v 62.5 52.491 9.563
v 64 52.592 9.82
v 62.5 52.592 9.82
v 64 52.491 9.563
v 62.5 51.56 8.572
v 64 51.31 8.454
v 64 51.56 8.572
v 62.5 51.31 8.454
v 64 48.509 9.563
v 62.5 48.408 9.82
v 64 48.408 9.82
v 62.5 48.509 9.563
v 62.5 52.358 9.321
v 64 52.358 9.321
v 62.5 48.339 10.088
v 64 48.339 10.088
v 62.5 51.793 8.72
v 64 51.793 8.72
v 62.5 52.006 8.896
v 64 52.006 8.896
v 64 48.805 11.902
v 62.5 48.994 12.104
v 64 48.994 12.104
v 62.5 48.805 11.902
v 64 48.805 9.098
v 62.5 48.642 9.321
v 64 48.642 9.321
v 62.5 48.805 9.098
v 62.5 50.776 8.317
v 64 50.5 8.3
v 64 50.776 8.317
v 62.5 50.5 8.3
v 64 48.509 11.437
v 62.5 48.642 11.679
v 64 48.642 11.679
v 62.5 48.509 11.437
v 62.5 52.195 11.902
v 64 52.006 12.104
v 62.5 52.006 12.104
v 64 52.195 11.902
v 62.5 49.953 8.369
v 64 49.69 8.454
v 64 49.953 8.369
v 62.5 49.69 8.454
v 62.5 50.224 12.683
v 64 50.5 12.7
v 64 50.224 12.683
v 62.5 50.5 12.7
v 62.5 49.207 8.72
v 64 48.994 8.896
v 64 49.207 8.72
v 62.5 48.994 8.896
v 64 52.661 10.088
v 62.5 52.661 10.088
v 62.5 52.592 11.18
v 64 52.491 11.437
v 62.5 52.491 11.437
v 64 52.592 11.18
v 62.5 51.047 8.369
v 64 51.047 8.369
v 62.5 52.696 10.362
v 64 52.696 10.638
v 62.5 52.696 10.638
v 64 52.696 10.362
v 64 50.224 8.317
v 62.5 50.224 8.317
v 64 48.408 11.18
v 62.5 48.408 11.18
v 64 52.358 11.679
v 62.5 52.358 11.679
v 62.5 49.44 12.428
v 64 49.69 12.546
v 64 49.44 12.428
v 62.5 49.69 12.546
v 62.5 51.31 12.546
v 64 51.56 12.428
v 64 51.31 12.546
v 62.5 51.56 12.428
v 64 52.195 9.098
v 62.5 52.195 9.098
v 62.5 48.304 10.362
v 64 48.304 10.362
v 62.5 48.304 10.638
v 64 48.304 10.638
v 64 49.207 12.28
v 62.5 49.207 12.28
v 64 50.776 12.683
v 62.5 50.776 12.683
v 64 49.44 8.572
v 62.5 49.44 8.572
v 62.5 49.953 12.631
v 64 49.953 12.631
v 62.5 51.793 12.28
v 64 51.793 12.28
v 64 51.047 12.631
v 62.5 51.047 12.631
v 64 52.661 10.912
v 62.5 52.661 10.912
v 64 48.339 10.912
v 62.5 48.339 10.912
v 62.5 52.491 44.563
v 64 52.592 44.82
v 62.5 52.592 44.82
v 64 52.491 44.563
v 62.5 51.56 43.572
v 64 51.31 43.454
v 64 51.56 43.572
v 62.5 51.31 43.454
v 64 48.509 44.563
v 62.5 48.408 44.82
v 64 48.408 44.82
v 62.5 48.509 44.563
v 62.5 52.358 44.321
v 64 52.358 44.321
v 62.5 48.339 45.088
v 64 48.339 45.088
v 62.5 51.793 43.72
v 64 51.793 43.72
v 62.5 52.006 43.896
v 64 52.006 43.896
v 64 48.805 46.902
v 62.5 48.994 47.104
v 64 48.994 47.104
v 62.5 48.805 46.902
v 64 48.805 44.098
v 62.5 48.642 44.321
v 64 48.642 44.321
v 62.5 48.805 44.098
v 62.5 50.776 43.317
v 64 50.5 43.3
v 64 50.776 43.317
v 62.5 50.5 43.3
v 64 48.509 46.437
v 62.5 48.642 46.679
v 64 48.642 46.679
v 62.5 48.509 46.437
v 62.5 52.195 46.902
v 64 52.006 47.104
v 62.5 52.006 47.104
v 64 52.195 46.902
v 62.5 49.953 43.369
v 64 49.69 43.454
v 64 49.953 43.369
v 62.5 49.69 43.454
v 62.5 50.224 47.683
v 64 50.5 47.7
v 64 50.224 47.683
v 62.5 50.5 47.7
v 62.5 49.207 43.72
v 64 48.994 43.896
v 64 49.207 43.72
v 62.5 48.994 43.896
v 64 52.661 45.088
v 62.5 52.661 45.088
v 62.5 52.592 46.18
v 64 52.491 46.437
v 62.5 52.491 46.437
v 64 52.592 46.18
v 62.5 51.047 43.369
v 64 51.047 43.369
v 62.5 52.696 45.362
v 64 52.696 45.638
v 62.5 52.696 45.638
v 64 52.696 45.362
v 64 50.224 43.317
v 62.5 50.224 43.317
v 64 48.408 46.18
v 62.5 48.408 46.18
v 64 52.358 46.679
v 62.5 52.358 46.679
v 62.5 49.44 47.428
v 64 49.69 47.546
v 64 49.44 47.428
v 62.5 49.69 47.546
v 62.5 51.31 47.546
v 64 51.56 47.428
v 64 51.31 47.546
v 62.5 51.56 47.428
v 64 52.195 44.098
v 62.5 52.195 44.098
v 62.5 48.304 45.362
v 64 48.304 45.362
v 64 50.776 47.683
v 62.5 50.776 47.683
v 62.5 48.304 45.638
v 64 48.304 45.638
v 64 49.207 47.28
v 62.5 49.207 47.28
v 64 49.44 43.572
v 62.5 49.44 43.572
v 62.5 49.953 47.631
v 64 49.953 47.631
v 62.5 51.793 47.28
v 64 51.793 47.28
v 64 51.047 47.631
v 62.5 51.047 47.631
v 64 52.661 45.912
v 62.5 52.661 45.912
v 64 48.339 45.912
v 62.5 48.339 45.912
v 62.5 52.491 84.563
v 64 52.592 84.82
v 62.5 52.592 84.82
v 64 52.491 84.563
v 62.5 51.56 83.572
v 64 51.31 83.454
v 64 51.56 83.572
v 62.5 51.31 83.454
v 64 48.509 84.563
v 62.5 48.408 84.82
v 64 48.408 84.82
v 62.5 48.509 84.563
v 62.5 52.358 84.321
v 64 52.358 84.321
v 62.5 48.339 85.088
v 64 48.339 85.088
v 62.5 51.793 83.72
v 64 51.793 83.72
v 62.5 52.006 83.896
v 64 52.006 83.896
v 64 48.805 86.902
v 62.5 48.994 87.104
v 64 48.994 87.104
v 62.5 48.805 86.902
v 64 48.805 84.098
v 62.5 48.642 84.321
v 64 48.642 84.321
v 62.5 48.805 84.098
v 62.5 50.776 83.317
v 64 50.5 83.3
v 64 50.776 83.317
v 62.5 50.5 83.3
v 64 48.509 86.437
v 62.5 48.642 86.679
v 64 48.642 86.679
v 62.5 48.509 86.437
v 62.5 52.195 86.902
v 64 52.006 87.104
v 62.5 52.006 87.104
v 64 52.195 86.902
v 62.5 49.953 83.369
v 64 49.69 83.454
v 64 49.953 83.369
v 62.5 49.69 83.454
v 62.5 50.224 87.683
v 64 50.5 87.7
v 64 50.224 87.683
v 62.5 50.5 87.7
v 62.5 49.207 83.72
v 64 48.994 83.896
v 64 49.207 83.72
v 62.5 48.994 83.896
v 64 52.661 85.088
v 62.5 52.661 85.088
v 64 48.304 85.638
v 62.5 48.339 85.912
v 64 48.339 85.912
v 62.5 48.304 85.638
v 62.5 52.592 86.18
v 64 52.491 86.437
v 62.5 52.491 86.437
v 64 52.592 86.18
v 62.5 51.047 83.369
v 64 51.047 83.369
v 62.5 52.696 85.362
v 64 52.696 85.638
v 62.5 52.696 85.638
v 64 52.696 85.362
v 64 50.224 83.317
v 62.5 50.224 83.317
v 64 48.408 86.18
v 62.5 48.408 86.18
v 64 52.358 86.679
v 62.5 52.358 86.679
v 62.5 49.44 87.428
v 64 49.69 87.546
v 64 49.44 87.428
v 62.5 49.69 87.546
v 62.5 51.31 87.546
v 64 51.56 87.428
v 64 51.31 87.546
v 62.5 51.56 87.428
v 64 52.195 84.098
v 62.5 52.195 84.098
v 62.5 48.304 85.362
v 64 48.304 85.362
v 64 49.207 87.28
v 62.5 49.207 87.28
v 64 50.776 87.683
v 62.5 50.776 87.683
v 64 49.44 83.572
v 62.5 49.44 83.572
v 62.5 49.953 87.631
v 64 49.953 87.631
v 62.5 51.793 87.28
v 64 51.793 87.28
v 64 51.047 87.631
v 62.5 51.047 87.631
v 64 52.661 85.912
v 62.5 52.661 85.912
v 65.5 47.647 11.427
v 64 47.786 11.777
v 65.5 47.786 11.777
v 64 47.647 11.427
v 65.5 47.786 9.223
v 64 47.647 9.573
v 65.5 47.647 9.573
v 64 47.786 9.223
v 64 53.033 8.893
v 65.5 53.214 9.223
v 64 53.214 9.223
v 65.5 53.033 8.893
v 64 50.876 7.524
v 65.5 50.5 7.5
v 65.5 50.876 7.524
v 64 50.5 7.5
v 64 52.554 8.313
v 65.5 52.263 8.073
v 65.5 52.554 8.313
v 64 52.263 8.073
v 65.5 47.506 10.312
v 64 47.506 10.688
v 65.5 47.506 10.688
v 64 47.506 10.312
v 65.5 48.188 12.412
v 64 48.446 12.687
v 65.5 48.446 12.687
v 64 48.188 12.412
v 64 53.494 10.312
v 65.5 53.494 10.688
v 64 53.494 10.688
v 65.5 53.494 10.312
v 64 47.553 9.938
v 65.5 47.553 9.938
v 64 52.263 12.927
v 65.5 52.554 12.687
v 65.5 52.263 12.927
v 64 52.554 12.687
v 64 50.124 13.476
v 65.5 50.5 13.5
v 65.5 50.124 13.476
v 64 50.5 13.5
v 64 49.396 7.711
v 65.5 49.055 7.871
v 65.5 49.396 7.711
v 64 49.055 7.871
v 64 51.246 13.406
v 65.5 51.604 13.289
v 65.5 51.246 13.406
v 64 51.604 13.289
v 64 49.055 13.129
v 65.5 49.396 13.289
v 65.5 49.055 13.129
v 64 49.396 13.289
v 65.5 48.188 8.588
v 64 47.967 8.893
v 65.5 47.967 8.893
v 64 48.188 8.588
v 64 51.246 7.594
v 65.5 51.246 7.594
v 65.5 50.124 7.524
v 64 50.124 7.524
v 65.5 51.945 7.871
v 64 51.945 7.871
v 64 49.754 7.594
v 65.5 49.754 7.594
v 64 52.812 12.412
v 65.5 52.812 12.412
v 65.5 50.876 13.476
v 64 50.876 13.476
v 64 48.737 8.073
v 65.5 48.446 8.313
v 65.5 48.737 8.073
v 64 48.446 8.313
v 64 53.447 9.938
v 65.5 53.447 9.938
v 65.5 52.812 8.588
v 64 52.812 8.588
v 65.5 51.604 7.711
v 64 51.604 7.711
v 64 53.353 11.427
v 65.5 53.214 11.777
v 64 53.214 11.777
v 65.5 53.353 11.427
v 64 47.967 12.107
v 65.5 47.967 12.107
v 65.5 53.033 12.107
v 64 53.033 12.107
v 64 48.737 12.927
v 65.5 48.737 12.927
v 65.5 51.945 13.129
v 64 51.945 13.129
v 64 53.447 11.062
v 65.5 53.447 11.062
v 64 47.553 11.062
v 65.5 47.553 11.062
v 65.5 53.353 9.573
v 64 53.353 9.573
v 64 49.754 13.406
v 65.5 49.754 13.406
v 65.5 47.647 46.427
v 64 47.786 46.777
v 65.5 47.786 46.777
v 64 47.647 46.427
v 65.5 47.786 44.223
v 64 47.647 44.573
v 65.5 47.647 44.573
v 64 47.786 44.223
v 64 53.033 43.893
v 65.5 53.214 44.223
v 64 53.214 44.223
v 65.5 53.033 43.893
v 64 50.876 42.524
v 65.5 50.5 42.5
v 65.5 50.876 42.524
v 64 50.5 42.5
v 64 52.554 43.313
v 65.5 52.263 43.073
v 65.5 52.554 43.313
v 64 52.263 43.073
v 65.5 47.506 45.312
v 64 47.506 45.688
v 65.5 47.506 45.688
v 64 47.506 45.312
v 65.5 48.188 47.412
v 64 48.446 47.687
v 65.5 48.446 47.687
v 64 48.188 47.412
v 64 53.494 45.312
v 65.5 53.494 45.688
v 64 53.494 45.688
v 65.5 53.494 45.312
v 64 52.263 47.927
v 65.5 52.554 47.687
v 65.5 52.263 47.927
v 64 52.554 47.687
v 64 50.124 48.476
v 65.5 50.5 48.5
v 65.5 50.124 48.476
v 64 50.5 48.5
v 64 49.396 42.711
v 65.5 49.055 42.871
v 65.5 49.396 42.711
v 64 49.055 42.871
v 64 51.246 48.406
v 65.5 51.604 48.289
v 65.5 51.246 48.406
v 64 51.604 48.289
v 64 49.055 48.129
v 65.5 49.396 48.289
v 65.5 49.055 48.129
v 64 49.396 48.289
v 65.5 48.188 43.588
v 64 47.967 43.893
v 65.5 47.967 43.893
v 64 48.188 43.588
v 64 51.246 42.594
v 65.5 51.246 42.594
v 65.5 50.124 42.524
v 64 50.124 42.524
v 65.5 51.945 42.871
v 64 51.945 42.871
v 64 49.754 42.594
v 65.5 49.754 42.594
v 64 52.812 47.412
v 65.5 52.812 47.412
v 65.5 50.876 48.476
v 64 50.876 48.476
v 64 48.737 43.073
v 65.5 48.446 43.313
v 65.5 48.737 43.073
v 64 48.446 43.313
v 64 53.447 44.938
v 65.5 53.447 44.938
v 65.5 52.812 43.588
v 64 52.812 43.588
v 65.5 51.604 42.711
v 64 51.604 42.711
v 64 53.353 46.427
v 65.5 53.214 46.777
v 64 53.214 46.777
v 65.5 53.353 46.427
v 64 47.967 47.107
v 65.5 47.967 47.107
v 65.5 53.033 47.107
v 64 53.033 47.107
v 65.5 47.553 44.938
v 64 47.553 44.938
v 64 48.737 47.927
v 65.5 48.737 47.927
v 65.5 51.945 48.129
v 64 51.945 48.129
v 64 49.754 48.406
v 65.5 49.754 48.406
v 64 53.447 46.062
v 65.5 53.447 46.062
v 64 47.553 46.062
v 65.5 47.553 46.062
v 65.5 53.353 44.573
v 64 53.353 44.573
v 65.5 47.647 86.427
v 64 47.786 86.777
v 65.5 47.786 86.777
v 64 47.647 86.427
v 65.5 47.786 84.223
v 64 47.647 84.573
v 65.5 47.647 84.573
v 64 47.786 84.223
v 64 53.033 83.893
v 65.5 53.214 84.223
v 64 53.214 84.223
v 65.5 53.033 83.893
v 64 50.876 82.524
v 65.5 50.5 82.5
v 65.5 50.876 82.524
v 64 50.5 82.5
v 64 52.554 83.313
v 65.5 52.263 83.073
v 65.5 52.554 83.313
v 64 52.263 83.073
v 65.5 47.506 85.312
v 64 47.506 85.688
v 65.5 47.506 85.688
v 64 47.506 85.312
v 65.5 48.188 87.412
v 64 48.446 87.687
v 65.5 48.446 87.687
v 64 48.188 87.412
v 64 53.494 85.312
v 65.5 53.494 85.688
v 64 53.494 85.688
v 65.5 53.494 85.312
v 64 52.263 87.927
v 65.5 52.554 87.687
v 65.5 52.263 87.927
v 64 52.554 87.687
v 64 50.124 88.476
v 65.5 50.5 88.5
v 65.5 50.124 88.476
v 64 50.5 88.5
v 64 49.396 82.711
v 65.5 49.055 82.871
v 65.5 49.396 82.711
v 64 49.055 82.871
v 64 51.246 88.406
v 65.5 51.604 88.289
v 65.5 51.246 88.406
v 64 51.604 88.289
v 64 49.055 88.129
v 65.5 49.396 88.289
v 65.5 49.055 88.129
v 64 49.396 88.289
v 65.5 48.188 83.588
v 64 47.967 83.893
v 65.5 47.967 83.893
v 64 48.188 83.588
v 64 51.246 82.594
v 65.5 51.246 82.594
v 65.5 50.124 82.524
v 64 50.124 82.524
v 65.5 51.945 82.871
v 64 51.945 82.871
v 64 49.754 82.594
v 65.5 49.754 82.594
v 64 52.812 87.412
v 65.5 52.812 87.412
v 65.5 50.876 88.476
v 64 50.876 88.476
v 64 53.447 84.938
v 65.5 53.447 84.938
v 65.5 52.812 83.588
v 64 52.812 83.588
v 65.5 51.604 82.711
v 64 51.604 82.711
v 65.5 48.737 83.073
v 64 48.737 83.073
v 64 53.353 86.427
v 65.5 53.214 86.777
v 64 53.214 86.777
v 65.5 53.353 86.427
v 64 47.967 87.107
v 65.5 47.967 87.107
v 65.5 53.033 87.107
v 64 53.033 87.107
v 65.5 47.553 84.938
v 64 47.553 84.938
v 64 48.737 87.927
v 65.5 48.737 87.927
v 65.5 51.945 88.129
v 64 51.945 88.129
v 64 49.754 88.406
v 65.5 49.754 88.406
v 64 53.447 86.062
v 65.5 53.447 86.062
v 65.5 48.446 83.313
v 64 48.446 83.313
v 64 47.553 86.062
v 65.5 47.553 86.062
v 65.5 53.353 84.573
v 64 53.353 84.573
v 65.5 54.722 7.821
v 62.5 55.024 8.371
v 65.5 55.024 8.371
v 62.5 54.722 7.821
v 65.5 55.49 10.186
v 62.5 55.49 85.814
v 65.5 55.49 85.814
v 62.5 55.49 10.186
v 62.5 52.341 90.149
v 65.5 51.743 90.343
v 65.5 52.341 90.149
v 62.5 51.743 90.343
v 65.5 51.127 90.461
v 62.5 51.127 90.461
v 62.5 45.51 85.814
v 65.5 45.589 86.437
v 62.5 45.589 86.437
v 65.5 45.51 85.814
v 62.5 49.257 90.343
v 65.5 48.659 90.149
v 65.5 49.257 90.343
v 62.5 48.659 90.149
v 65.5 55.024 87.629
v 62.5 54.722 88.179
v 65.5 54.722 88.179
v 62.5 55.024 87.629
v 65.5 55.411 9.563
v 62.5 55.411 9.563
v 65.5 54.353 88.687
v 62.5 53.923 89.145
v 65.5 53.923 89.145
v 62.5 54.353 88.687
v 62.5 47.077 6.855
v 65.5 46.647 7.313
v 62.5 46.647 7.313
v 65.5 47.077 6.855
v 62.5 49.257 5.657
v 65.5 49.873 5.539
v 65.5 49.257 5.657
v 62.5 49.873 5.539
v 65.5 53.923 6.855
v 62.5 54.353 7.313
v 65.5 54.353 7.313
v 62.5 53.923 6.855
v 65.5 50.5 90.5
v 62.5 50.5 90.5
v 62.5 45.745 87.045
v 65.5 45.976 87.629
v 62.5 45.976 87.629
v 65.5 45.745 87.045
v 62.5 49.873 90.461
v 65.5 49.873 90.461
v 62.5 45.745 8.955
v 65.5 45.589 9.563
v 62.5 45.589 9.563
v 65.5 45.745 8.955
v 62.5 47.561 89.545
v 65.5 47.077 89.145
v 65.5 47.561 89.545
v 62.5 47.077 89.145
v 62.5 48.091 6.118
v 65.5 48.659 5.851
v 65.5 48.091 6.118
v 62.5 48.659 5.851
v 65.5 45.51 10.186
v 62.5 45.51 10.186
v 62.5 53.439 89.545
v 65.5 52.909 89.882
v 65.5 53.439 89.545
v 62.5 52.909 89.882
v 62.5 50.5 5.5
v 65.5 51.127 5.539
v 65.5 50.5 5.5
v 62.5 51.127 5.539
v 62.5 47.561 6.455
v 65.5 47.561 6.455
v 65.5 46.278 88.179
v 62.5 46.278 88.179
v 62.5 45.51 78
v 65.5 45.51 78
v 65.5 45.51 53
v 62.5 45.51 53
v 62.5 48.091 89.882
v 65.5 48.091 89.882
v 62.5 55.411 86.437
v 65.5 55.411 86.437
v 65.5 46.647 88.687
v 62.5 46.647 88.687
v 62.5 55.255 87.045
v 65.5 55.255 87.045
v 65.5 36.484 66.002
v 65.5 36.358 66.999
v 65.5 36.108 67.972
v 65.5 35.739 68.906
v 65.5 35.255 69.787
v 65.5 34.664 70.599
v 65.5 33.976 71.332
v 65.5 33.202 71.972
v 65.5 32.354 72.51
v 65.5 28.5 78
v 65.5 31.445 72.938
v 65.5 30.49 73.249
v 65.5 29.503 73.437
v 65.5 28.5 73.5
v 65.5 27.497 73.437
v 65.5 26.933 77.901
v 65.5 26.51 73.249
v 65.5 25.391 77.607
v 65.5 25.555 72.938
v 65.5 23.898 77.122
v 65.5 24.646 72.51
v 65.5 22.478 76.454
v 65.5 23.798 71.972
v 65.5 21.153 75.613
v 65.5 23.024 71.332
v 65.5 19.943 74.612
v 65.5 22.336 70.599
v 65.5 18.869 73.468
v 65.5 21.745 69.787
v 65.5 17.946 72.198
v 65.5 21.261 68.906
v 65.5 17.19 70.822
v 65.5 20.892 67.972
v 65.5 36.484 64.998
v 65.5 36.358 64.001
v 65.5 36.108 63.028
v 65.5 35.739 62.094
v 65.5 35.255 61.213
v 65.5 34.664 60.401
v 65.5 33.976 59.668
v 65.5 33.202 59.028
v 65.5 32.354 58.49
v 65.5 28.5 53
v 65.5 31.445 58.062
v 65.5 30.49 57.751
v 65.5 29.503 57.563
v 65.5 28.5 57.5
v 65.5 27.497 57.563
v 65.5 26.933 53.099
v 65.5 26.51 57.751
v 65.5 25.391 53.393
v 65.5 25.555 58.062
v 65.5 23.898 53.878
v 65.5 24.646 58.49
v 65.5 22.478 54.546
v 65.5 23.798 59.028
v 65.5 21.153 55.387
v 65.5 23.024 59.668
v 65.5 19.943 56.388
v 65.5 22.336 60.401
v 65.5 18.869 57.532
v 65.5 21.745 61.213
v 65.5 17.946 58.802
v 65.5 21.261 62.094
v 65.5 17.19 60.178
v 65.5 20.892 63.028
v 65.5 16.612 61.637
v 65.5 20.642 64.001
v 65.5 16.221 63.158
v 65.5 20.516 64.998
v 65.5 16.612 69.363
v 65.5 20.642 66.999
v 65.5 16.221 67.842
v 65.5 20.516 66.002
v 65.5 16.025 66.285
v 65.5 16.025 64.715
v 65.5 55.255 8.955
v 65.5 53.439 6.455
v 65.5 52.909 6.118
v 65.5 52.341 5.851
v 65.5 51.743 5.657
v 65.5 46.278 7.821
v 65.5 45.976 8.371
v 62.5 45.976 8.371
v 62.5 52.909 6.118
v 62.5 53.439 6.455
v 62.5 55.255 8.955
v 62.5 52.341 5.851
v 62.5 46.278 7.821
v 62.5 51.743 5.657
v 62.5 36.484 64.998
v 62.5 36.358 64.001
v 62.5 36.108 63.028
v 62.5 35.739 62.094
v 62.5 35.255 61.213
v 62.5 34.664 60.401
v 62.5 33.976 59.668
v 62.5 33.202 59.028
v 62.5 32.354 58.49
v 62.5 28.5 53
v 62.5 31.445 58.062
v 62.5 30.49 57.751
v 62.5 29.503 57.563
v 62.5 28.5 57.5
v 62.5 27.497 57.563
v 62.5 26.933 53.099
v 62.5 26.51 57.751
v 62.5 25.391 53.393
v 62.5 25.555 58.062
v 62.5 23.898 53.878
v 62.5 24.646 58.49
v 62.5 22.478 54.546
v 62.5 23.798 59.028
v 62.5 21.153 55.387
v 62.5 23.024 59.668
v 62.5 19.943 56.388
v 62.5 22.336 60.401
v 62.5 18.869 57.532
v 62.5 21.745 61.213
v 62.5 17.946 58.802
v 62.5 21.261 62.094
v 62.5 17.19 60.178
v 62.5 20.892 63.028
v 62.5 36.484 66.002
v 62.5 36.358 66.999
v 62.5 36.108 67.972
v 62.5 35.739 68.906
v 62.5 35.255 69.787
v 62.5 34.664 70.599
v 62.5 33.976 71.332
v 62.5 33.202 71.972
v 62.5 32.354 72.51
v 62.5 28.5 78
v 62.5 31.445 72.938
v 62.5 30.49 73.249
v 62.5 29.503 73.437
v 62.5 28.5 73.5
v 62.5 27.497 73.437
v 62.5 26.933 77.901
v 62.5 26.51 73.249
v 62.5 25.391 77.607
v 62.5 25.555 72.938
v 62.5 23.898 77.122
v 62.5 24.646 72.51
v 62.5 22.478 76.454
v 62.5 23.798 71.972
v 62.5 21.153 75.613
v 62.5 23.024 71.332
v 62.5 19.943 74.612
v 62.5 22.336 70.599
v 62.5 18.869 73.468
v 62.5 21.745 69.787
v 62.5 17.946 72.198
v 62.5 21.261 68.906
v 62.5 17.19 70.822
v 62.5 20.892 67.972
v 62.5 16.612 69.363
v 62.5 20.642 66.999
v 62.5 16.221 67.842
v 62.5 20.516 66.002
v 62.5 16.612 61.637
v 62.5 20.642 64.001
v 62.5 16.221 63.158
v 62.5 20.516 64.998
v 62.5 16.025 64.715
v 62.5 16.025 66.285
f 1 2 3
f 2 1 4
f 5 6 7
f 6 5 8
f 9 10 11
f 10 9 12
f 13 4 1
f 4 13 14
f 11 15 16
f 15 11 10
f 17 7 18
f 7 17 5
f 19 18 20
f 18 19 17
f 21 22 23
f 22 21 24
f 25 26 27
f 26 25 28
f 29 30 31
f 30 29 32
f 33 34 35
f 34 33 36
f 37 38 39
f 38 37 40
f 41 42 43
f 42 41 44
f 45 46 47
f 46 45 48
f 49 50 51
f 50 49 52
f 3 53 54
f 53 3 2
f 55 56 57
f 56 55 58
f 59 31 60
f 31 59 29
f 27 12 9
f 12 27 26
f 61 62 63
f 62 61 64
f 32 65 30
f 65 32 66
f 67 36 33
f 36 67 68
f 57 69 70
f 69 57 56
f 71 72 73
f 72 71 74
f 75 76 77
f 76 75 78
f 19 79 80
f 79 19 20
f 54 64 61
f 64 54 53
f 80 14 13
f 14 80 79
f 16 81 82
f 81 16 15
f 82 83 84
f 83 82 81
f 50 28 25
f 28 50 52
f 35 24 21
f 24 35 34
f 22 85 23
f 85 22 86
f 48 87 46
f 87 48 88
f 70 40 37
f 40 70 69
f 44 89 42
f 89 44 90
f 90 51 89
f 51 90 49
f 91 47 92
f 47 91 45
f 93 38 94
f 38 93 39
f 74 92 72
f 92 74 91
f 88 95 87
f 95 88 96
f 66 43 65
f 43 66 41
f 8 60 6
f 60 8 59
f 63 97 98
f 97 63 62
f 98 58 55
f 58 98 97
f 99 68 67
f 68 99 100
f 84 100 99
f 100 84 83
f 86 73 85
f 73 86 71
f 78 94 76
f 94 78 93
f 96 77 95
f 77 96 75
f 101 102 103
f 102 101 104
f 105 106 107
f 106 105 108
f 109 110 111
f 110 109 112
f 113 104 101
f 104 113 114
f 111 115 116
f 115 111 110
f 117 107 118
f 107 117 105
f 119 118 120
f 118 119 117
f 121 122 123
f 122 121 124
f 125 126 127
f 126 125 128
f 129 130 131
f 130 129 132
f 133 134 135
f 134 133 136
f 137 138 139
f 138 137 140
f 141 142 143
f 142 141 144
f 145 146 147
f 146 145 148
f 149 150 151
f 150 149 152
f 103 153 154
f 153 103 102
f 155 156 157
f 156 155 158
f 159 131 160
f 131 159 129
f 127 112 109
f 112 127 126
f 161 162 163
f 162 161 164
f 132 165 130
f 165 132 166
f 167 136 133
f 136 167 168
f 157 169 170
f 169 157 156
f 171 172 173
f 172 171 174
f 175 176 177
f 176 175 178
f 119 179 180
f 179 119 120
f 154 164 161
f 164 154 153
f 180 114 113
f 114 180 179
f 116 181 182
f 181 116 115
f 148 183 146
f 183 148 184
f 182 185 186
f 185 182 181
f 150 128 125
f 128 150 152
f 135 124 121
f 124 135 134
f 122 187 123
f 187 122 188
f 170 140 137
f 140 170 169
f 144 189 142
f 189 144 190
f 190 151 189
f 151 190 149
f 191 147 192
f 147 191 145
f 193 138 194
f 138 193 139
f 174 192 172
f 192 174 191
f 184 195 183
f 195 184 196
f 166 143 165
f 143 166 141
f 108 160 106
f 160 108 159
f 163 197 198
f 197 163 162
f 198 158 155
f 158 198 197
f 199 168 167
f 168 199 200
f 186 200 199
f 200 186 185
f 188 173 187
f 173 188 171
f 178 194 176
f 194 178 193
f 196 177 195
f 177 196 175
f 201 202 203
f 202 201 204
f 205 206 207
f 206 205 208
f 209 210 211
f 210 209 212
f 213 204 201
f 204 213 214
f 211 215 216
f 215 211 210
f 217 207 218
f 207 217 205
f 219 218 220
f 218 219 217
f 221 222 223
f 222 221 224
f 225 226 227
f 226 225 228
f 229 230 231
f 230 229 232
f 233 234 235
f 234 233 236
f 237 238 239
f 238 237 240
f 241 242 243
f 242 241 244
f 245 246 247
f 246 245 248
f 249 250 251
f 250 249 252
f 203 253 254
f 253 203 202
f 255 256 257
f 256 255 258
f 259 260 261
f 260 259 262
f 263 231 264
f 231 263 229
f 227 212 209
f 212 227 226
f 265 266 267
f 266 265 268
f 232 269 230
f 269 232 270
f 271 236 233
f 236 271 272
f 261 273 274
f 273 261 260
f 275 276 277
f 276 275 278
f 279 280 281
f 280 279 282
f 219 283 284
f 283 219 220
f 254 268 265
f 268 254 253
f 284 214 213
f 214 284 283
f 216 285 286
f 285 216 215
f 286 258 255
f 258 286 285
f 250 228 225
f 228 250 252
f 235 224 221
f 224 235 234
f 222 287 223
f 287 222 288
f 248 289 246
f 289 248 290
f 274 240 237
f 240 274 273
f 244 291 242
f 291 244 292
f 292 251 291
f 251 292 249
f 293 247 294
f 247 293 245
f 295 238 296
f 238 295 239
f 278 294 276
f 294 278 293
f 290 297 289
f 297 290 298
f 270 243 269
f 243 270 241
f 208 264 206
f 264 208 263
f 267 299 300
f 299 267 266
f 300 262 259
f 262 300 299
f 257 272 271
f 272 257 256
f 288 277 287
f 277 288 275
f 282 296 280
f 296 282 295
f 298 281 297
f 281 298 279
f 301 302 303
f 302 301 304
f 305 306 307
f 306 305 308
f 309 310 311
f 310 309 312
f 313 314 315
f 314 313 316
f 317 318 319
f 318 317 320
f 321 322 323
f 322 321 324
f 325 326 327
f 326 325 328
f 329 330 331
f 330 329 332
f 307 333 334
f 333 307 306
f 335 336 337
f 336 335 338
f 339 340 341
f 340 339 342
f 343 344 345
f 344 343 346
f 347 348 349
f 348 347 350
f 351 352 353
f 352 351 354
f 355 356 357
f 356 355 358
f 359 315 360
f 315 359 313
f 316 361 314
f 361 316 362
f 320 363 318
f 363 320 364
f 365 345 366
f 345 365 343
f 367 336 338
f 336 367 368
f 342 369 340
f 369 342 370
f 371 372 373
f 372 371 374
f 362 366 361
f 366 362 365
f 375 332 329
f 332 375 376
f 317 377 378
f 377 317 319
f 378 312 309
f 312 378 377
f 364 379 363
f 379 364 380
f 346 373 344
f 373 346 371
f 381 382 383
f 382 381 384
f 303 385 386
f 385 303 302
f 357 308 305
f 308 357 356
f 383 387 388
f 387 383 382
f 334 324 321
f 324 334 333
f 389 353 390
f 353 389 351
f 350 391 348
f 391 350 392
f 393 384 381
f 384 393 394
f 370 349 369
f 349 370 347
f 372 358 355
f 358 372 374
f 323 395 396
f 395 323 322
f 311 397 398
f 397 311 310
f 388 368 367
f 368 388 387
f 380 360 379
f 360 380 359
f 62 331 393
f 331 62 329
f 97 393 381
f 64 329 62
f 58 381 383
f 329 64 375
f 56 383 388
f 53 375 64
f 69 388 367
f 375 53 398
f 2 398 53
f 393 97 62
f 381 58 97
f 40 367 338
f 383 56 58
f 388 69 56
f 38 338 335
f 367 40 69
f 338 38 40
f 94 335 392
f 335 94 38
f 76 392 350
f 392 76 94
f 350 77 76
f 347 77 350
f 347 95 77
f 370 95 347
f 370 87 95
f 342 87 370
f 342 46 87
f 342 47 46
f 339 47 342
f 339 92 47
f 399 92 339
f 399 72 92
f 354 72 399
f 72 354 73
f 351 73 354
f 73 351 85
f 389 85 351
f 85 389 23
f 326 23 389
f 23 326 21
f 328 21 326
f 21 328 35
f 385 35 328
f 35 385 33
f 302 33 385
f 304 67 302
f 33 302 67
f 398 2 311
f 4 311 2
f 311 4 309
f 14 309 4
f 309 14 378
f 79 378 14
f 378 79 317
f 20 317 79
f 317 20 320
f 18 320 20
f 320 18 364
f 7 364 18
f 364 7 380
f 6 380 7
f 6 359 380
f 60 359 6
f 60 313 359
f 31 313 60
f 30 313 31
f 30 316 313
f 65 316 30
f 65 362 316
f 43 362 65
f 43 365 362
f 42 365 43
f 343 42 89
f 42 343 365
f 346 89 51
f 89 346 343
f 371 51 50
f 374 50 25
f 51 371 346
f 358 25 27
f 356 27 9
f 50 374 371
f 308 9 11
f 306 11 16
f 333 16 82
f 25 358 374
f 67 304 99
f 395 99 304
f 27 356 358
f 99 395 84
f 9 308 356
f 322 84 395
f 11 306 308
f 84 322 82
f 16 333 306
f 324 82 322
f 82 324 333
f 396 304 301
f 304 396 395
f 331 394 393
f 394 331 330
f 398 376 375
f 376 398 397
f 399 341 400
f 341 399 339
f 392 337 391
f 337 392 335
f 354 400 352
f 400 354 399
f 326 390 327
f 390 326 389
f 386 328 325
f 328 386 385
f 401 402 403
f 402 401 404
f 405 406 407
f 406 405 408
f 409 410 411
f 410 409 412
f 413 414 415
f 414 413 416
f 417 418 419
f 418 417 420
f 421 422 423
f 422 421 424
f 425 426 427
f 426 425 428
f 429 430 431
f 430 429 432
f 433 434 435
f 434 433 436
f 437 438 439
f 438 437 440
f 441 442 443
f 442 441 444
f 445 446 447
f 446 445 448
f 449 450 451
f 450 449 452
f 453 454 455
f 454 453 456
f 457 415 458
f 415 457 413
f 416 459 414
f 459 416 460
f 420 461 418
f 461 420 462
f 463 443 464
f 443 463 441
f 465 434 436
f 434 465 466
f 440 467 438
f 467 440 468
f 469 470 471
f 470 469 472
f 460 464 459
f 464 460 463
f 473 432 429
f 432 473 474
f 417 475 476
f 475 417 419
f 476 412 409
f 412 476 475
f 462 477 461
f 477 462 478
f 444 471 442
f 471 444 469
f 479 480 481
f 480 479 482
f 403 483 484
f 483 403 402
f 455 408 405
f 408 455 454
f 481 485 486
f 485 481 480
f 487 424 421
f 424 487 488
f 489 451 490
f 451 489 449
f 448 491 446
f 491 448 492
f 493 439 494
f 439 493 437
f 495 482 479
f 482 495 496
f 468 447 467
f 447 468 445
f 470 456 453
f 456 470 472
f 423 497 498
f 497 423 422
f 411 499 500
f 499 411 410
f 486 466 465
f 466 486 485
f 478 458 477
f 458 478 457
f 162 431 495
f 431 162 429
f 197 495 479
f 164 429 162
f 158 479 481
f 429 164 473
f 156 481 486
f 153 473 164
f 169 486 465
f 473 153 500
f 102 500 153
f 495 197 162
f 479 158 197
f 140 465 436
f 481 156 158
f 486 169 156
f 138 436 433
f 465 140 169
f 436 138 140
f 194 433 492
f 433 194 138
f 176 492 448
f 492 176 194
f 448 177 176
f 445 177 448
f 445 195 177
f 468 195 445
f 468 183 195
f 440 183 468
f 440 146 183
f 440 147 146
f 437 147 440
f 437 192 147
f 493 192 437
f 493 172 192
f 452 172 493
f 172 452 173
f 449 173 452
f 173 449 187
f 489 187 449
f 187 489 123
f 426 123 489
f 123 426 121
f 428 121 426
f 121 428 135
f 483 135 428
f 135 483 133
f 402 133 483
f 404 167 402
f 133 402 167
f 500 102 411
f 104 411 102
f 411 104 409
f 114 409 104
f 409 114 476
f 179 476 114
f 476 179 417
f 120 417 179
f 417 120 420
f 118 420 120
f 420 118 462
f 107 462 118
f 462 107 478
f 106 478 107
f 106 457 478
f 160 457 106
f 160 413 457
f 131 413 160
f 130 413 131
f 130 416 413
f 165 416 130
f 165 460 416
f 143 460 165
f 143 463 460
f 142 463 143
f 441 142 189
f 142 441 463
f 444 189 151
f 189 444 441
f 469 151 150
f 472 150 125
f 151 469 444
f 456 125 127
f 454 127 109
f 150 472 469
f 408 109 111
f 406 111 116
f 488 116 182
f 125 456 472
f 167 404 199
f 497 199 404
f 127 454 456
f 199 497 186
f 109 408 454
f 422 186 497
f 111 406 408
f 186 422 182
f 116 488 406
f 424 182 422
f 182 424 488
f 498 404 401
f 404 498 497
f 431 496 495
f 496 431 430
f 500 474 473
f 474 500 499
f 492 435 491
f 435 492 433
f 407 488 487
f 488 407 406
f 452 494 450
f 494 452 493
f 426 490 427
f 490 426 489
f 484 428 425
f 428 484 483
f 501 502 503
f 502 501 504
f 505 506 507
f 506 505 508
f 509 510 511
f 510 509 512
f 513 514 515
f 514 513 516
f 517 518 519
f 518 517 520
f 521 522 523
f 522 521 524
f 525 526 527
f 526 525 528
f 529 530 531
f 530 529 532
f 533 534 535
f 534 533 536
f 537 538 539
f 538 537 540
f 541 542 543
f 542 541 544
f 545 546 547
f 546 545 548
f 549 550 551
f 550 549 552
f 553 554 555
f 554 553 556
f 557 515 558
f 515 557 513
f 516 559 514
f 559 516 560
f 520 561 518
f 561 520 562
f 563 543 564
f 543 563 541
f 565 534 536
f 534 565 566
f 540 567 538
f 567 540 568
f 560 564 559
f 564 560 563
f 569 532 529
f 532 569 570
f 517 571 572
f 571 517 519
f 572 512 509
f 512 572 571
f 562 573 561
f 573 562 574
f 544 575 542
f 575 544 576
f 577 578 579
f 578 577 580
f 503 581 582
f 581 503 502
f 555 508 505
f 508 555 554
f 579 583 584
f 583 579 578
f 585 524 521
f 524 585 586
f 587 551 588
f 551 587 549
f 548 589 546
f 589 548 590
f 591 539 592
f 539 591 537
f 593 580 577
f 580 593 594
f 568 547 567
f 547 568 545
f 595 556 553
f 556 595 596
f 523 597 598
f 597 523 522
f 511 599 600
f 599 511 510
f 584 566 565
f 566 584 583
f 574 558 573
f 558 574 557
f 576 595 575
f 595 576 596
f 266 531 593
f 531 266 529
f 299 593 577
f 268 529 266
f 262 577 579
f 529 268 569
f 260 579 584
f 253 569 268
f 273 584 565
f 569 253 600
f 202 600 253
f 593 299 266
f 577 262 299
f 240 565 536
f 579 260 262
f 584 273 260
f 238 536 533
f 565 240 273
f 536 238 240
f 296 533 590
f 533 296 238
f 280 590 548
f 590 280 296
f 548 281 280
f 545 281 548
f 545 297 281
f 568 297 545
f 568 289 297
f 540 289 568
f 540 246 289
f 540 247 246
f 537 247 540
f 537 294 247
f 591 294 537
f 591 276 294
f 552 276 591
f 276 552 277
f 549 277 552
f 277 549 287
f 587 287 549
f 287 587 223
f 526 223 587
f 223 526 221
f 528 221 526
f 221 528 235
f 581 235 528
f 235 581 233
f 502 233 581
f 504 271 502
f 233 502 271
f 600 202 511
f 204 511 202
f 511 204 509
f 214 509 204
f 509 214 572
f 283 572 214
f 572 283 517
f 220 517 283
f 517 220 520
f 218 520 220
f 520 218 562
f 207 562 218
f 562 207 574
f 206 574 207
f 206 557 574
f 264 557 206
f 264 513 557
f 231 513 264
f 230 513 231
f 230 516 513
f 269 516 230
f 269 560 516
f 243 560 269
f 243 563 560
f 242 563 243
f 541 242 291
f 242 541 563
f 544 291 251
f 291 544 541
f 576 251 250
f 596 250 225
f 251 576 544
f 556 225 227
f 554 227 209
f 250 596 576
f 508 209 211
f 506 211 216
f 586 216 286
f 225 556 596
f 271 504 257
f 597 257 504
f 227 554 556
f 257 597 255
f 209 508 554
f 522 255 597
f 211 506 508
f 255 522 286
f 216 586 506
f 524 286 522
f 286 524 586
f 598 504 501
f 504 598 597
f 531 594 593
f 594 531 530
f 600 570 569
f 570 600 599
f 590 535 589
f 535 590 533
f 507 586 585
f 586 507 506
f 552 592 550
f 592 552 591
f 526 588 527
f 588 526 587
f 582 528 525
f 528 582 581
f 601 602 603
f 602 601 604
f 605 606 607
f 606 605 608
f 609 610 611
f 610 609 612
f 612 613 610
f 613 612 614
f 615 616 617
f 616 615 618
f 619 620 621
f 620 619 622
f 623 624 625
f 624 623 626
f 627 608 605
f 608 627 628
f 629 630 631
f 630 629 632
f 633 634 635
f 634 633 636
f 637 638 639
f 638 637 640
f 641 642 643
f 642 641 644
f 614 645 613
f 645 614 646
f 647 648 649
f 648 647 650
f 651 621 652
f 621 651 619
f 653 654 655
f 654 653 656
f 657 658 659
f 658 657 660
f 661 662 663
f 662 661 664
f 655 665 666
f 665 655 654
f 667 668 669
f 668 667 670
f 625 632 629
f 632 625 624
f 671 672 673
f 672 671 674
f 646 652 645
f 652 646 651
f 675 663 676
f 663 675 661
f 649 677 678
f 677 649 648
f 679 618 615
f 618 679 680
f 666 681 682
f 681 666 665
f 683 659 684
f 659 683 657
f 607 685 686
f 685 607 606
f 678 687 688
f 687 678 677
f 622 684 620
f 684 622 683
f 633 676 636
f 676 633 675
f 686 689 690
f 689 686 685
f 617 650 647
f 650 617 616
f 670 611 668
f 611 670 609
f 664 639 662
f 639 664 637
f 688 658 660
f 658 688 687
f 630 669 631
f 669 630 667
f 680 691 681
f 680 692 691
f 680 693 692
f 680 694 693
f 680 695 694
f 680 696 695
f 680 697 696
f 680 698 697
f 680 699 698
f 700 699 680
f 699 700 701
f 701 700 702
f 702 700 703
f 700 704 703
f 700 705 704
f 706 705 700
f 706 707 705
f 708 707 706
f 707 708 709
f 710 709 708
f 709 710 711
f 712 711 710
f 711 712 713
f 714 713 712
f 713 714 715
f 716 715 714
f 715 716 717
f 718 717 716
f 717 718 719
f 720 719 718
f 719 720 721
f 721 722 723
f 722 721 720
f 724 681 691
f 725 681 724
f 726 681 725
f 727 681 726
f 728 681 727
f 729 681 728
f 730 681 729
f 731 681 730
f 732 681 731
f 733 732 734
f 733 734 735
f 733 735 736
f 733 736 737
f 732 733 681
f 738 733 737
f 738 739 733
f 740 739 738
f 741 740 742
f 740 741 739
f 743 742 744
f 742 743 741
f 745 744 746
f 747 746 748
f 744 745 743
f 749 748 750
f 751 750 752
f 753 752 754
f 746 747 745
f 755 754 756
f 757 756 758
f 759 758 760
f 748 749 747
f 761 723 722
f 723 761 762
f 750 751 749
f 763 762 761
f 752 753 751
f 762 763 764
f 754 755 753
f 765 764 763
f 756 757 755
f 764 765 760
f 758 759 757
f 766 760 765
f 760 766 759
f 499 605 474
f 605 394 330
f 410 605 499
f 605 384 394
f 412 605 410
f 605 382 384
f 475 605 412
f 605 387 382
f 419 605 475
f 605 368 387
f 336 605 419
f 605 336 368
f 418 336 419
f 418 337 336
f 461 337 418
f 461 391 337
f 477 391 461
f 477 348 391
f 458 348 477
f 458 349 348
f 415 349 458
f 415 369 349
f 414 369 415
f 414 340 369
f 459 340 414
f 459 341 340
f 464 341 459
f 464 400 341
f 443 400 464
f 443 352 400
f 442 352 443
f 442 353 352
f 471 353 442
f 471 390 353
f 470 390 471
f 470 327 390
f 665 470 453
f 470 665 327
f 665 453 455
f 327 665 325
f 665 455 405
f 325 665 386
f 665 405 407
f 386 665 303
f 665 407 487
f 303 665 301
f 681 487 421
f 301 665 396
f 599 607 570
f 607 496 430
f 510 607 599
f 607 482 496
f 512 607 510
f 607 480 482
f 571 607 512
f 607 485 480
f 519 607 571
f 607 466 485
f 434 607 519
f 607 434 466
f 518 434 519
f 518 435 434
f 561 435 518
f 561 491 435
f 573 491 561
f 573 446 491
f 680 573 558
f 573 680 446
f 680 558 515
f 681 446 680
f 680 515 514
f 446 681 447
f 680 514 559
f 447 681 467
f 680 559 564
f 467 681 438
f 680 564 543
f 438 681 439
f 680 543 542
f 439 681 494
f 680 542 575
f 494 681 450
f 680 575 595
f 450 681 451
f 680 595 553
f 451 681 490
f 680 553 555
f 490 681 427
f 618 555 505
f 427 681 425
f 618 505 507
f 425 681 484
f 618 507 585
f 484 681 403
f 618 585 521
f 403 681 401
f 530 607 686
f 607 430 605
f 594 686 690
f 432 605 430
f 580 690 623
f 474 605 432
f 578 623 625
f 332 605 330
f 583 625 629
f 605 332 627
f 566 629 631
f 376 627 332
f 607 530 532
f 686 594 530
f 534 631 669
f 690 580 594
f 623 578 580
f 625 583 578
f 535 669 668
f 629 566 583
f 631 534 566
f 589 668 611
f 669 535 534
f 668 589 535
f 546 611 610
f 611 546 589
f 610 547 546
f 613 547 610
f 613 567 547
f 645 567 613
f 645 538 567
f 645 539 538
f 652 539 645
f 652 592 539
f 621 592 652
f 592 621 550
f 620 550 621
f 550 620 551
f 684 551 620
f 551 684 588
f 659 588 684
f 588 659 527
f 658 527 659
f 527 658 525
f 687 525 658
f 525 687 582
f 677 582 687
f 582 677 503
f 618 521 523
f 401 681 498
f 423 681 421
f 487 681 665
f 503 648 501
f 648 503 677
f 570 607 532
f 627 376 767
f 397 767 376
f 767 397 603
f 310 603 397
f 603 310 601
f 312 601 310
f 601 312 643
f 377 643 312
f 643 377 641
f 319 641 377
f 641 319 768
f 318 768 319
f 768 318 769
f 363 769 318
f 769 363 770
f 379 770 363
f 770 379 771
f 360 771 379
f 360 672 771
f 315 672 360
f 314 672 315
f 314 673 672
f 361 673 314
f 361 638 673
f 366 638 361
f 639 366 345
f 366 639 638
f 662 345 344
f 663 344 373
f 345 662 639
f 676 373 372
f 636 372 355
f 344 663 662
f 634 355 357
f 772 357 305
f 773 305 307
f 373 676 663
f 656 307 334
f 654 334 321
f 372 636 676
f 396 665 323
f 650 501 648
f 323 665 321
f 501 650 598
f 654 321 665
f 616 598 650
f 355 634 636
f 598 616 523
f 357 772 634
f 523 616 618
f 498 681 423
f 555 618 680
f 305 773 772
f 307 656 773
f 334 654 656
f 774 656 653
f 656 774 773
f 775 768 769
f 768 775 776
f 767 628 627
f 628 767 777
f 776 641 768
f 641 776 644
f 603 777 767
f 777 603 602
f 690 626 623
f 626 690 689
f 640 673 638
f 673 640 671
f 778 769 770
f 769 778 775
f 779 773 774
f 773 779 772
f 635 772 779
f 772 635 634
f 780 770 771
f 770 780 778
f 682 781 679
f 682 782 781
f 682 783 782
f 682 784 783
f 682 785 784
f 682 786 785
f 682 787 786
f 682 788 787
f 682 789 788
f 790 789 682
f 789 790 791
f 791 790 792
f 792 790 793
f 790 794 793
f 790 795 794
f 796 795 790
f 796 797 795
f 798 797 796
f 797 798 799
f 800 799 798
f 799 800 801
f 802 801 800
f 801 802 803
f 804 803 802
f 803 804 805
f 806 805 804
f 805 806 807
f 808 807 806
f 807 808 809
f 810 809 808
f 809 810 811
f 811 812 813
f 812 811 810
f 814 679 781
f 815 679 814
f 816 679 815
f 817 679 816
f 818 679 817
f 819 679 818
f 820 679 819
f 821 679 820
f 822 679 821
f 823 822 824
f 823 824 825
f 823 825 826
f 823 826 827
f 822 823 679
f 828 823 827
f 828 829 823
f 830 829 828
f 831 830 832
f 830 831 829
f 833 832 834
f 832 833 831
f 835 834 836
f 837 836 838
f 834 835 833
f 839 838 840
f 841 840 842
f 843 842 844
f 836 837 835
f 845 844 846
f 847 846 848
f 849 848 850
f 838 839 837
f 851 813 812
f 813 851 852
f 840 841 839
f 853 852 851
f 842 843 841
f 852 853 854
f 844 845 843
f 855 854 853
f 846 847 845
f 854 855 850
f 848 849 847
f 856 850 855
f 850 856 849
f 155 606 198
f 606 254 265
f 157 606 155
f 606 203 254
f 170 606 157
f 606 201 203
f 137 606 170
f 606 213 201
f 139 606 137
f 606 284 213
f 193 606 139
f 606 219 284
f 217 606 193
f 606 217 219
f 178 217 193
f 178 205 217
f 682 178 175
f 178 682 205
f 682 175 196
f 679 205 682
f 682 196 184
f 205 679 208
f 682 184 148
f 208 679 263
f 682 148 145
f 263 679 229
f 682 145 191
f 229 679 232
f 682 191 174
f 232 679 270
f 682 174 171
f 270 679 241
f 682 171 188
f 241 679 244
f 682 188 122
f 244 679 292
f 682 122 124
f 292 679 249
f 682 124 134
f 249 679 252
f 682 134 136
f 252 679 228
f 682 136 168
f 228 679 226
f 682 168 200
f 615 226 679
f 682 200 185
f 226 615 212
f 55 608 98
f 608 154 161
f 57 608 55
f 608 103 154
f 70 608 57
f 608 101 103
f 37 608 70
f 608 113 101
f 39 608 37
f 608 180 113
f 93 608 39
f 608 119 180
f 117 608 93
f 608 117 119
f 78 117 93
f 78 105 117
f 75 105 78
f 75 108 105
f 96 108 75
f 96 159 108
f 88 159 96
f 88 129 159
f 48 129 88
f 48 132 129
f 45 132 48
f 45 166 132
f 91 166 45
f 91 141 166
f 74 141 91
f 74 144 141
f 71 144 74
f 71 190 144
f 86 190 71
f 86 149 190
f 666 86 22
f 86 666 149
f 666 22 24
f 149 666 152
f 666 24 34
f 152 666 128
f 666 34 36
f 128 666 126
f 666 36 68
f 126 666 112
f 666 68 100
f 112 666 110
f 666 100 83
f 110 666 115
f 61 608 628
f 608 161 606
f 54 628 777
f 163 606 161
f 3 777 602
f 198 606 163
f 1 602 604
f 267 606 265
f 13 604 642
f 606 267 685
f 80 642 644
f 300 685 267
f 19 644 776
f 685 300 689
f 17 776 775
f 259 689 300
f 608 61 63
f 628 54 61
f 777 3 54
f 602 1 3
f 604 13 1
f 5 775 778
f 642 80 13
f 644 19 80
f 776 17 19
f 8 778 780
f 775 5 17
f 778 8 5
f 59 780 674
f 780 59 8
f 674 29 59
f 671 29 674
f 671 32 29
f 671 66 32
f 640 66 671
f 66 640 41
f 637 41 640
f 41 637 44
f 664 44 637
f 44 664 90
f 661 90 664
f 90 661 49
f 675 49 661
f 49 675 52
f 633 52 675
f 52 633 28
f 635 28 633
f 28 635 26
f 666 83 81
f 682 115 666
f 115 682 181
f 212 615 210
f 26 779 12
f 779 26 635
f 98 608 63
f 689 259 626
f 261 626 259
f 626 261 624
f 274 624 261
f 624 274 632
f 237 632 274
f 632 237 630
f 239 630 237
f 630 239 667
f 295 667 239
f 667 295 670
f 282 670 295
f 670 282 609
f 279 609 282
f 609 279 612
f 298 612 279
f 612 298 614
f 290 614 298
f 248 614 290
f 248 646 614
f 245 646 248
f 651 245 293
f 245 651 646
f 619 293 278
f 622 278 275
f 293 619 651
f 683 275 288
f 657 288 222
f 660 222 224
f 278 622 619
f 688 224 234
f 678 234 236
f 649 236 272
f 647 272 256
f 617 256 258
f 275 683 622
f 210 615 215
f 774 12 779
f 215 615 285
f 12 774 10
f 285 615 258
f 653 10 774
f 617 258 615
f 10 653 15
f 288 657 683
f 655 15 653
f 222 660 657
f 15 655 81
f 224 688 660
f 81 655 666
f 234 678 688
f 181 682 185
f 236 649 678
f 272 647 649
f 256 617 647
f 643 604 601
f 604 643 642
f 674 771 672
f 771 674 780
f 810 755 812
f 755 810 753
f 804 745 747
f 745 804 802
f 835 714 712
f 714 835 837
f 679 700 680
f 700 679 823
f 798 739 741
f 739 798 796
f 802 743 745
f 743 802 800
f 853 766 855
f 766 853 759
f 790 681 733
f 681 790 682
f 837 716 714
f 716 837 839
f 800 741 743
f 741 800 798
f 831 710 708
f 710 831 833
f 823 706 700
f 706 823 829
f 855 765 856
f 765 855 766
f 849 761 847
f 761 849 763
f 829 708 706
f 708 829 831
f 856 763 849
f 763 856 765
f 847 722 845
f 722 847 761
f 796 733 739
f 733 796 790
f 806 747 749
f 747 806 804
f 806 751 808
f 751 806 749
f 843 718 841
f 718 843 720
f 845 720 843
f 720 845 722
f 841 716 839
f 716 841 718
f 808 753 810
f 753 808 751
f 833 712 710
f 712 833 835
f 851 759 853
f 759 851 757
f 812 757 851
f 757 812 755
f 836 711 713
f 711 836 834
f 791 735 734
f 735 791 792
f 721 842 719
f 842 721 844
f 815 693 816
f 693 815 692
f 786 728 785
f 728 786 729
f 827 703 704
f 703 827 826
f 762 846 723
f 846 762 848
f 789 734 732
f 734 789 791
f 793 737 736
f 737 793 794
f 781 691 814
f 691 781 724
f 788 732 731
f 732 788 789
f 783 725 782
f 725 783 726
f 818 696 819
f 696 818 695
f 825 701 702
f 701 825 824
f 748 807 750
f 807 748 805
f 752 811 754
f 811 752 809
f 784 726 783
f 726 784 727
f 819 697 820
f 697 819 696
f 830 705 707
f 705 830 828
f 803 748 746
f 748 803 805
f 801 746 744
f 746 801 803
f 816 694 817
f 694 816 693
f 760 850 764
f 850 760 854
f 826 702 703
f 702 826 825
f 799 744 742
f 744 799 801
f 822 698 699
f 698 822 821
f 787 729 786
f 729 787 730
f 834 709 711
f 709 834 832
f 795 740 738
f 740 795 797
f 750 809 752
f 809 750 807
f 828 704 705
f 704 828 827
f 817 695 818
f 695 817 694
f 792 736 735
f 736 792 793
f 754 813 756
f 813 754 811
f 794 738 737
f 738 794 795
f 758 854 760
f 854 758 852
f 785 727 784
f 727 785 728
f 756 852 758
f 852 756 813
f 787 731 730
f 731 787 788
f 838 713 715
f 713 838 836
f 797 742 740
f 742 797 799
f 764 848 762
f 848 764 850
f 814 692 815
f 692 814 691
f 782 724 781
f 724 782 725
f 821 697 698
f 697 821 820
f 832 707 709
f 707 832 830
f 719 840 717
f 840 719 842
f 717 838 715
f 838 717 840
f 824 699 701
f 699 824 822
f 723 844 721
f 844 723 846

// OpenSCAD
// file: baseframe.scad
module Centerframe(W,R,D,T,H,O, Nb = [0,1,2,3], Nm = [0,1,2,3], Rm = 2.2){ 
   
    difference(){
    union(){
    base(W,R,D,T);
    translate([0,0,D]){
        base(W,R,H,D);
    }
    
    sideHoleSupports(5,W,D,O);
    }
    
    translate([0,0,-4*D]){
    sideHoleSupports(Rm,W,3*D,O);
    }
    
    for(i = [0:3]){
        rotate([0,0,90*i]){
        translate([-(0.85*W-2*O-10)/2,W/2-D-0.5*D,D]){ 
        cube([0.85*W-2*O-10,D,1.5*D]);}}
    }
    
    for(i = [0:3]){
    rotate([0,0,90*i]){
    union(){
    translate([-12-(0.5*W-2*O-14.5),W/2-D-0.5*D-D,3]){ 
    cube([0.5*W-2*O-14.5,2*D,1.5*D]);}
    translate([12,W/2-D-0.5*D-D,3]){ 
    cube([0.5*W-2*O-14.5,2*D,1.5*D]);}}}
    }
    
    }
    
    for(i = Nb){
        rotate([0,0,90*i]){
            bottomHoleSupport(R,W,D,Rm);
        }
    }
    
    for(i = Nm){
        rotate([0,0,90*i]){
            midHoleSupports(0.95*R,W,D,Rm);
        }
    }
    
}

module midHoleSupports(R,W,D,Rm){
    translate([0,-W/2+4,D/2]){
    difference(){
        union(){
    translate([-12,2,0]){baseRectangle(10,R,D);}
    translate([-5,2,0]){baseRectangle(10,R,D);}
    translate([2,2,0]){baseRectangle(10,R,D);}
    translate([0,2,0]){baseRectangle(10,R,D);}
    translate([-10,2,0]){baseRectangle(10,R,D);}
    }
    translate([-7.5,8,-D]){cylinder(2*D,Rm,Rm);}
    translate([7.5,8,-D]){cylinder(2*D,Rm,Rm);}
    }
    }
}   

module sideHoleSupports(R,W,D,O){
    for(j = [0:3]){
        rotate([0,0,90*j]){
    for(i = [0:1]){
    translate([W/2-D,-W/2 + O + i*(W-2*O),2*D]){
        rotate([0,90,0]){
        cylinder(D,R,R);
        }
    }
    }
    }   
}
}

module base(W,R,D,T){
    
    translate([-W/2,-W/2,0]){
    translate([0,0,D/2]){
    difference(){
    baseRectangle(W,R,D);
    
    translate([T,T,0]){
    baseRectangle(W-2*T,0.8*R,2*D);}
    }
    }
    }
}

module bottomHoleSupport(R,W,D,Rm){
    
    translate([W/2-R+1,W/2-R+1,D/2]){
    rotate([0,0,180]){
        difference(){
            baseRectangle(O+3,5,D);
            translate([O-2,O-2,0]){
            cylinder(2*D,Rm*0.9,Rm*1.1,center = true);
    }
    }
    }
    }
}

module baseRectangle(W,R,D){
    translate([0,0,-D/2]){
    linear_extrude(D){
        rounded_square(W,R);
    }
    }
}
// file: roundsquare.scad
module rounded_square( W, R ) {
	translate( [ R, R, 0 ] )
		minkowski() {
			square( W - 2 * R );
			circle( R );
		}
}
// main file
include <roundsquare.scad>;
include <baseframe.scad>;
//include <VEAB.scad>;
//include <powersupply.scad>;
//import("bridge.stl");

$fn=50;

W = 125;  // width of base plate
R = 3;    // corner radius base plate
D = 5;    // thickness of walls
T = 8;    // thickness bottom plateau
H = 5;
O = 12; // side hole offset

D1 = 35;
D2 = 40;

POWERBUTTON = true;

//Centerframe(W,R,D,T,H,O,Nm = [],Nb = []);
//translate([0,0,D1]){Centerframe(W,R,D,T,H,O,Nm = [],Nb = []);}

//translate([0,0,D1+D2]){Centerframe(W,R,D,T,H,O,Nm = [],Nb = []);}

bridge();



//mirror([0,1,0]){bridge();}


module cylinderOut(Dist,R,H=3,C = false){
    
    translate([W/2,W/2 - O,Dist-2.5+D+T]){
    rotate([0,90,0]){cylinder(H,R,R,center = C);}
    }
    
}

module bridge(){
    
difference(){
union(){
hull(){
cylinderOut(0,5);
cylinderOut(D1,5);
cylinderOut(D1+D2,5);
}
}

union(){
cylinderOut(0,2.2,H=20,C=true);
cylinderOut(D1,2.2,H=20,C=true);
cylinderOut(D1+D2,2.2,H=20,C=true);
}

translate([3,0,0]){
union(){
cylinderOut(0,3,H=3,C=true);
cylinderOut(D1,3,H=3,C=true);
cylinderOut(D1+D2,3,H=3,C=true);
}
}
}

if (POWERBUTTON){
difference(){
hull(){
translate([W/2,W/2 - O - 12 - 10,D1+D2/2-2.5+D+T]){
rotate([0,90,0]){
cylinder(3,12.5,12.5);
translate([0,12.5+10,3/2]){cube([25,5,3],center = true);}
}}}

translate([W/2+1,W/2 - O - 12 - 10,D1+D2/2-2.5+D+T]){
rotate([0,90,0]){
cylinder(5,8,8,center = true);}}

}}

}
